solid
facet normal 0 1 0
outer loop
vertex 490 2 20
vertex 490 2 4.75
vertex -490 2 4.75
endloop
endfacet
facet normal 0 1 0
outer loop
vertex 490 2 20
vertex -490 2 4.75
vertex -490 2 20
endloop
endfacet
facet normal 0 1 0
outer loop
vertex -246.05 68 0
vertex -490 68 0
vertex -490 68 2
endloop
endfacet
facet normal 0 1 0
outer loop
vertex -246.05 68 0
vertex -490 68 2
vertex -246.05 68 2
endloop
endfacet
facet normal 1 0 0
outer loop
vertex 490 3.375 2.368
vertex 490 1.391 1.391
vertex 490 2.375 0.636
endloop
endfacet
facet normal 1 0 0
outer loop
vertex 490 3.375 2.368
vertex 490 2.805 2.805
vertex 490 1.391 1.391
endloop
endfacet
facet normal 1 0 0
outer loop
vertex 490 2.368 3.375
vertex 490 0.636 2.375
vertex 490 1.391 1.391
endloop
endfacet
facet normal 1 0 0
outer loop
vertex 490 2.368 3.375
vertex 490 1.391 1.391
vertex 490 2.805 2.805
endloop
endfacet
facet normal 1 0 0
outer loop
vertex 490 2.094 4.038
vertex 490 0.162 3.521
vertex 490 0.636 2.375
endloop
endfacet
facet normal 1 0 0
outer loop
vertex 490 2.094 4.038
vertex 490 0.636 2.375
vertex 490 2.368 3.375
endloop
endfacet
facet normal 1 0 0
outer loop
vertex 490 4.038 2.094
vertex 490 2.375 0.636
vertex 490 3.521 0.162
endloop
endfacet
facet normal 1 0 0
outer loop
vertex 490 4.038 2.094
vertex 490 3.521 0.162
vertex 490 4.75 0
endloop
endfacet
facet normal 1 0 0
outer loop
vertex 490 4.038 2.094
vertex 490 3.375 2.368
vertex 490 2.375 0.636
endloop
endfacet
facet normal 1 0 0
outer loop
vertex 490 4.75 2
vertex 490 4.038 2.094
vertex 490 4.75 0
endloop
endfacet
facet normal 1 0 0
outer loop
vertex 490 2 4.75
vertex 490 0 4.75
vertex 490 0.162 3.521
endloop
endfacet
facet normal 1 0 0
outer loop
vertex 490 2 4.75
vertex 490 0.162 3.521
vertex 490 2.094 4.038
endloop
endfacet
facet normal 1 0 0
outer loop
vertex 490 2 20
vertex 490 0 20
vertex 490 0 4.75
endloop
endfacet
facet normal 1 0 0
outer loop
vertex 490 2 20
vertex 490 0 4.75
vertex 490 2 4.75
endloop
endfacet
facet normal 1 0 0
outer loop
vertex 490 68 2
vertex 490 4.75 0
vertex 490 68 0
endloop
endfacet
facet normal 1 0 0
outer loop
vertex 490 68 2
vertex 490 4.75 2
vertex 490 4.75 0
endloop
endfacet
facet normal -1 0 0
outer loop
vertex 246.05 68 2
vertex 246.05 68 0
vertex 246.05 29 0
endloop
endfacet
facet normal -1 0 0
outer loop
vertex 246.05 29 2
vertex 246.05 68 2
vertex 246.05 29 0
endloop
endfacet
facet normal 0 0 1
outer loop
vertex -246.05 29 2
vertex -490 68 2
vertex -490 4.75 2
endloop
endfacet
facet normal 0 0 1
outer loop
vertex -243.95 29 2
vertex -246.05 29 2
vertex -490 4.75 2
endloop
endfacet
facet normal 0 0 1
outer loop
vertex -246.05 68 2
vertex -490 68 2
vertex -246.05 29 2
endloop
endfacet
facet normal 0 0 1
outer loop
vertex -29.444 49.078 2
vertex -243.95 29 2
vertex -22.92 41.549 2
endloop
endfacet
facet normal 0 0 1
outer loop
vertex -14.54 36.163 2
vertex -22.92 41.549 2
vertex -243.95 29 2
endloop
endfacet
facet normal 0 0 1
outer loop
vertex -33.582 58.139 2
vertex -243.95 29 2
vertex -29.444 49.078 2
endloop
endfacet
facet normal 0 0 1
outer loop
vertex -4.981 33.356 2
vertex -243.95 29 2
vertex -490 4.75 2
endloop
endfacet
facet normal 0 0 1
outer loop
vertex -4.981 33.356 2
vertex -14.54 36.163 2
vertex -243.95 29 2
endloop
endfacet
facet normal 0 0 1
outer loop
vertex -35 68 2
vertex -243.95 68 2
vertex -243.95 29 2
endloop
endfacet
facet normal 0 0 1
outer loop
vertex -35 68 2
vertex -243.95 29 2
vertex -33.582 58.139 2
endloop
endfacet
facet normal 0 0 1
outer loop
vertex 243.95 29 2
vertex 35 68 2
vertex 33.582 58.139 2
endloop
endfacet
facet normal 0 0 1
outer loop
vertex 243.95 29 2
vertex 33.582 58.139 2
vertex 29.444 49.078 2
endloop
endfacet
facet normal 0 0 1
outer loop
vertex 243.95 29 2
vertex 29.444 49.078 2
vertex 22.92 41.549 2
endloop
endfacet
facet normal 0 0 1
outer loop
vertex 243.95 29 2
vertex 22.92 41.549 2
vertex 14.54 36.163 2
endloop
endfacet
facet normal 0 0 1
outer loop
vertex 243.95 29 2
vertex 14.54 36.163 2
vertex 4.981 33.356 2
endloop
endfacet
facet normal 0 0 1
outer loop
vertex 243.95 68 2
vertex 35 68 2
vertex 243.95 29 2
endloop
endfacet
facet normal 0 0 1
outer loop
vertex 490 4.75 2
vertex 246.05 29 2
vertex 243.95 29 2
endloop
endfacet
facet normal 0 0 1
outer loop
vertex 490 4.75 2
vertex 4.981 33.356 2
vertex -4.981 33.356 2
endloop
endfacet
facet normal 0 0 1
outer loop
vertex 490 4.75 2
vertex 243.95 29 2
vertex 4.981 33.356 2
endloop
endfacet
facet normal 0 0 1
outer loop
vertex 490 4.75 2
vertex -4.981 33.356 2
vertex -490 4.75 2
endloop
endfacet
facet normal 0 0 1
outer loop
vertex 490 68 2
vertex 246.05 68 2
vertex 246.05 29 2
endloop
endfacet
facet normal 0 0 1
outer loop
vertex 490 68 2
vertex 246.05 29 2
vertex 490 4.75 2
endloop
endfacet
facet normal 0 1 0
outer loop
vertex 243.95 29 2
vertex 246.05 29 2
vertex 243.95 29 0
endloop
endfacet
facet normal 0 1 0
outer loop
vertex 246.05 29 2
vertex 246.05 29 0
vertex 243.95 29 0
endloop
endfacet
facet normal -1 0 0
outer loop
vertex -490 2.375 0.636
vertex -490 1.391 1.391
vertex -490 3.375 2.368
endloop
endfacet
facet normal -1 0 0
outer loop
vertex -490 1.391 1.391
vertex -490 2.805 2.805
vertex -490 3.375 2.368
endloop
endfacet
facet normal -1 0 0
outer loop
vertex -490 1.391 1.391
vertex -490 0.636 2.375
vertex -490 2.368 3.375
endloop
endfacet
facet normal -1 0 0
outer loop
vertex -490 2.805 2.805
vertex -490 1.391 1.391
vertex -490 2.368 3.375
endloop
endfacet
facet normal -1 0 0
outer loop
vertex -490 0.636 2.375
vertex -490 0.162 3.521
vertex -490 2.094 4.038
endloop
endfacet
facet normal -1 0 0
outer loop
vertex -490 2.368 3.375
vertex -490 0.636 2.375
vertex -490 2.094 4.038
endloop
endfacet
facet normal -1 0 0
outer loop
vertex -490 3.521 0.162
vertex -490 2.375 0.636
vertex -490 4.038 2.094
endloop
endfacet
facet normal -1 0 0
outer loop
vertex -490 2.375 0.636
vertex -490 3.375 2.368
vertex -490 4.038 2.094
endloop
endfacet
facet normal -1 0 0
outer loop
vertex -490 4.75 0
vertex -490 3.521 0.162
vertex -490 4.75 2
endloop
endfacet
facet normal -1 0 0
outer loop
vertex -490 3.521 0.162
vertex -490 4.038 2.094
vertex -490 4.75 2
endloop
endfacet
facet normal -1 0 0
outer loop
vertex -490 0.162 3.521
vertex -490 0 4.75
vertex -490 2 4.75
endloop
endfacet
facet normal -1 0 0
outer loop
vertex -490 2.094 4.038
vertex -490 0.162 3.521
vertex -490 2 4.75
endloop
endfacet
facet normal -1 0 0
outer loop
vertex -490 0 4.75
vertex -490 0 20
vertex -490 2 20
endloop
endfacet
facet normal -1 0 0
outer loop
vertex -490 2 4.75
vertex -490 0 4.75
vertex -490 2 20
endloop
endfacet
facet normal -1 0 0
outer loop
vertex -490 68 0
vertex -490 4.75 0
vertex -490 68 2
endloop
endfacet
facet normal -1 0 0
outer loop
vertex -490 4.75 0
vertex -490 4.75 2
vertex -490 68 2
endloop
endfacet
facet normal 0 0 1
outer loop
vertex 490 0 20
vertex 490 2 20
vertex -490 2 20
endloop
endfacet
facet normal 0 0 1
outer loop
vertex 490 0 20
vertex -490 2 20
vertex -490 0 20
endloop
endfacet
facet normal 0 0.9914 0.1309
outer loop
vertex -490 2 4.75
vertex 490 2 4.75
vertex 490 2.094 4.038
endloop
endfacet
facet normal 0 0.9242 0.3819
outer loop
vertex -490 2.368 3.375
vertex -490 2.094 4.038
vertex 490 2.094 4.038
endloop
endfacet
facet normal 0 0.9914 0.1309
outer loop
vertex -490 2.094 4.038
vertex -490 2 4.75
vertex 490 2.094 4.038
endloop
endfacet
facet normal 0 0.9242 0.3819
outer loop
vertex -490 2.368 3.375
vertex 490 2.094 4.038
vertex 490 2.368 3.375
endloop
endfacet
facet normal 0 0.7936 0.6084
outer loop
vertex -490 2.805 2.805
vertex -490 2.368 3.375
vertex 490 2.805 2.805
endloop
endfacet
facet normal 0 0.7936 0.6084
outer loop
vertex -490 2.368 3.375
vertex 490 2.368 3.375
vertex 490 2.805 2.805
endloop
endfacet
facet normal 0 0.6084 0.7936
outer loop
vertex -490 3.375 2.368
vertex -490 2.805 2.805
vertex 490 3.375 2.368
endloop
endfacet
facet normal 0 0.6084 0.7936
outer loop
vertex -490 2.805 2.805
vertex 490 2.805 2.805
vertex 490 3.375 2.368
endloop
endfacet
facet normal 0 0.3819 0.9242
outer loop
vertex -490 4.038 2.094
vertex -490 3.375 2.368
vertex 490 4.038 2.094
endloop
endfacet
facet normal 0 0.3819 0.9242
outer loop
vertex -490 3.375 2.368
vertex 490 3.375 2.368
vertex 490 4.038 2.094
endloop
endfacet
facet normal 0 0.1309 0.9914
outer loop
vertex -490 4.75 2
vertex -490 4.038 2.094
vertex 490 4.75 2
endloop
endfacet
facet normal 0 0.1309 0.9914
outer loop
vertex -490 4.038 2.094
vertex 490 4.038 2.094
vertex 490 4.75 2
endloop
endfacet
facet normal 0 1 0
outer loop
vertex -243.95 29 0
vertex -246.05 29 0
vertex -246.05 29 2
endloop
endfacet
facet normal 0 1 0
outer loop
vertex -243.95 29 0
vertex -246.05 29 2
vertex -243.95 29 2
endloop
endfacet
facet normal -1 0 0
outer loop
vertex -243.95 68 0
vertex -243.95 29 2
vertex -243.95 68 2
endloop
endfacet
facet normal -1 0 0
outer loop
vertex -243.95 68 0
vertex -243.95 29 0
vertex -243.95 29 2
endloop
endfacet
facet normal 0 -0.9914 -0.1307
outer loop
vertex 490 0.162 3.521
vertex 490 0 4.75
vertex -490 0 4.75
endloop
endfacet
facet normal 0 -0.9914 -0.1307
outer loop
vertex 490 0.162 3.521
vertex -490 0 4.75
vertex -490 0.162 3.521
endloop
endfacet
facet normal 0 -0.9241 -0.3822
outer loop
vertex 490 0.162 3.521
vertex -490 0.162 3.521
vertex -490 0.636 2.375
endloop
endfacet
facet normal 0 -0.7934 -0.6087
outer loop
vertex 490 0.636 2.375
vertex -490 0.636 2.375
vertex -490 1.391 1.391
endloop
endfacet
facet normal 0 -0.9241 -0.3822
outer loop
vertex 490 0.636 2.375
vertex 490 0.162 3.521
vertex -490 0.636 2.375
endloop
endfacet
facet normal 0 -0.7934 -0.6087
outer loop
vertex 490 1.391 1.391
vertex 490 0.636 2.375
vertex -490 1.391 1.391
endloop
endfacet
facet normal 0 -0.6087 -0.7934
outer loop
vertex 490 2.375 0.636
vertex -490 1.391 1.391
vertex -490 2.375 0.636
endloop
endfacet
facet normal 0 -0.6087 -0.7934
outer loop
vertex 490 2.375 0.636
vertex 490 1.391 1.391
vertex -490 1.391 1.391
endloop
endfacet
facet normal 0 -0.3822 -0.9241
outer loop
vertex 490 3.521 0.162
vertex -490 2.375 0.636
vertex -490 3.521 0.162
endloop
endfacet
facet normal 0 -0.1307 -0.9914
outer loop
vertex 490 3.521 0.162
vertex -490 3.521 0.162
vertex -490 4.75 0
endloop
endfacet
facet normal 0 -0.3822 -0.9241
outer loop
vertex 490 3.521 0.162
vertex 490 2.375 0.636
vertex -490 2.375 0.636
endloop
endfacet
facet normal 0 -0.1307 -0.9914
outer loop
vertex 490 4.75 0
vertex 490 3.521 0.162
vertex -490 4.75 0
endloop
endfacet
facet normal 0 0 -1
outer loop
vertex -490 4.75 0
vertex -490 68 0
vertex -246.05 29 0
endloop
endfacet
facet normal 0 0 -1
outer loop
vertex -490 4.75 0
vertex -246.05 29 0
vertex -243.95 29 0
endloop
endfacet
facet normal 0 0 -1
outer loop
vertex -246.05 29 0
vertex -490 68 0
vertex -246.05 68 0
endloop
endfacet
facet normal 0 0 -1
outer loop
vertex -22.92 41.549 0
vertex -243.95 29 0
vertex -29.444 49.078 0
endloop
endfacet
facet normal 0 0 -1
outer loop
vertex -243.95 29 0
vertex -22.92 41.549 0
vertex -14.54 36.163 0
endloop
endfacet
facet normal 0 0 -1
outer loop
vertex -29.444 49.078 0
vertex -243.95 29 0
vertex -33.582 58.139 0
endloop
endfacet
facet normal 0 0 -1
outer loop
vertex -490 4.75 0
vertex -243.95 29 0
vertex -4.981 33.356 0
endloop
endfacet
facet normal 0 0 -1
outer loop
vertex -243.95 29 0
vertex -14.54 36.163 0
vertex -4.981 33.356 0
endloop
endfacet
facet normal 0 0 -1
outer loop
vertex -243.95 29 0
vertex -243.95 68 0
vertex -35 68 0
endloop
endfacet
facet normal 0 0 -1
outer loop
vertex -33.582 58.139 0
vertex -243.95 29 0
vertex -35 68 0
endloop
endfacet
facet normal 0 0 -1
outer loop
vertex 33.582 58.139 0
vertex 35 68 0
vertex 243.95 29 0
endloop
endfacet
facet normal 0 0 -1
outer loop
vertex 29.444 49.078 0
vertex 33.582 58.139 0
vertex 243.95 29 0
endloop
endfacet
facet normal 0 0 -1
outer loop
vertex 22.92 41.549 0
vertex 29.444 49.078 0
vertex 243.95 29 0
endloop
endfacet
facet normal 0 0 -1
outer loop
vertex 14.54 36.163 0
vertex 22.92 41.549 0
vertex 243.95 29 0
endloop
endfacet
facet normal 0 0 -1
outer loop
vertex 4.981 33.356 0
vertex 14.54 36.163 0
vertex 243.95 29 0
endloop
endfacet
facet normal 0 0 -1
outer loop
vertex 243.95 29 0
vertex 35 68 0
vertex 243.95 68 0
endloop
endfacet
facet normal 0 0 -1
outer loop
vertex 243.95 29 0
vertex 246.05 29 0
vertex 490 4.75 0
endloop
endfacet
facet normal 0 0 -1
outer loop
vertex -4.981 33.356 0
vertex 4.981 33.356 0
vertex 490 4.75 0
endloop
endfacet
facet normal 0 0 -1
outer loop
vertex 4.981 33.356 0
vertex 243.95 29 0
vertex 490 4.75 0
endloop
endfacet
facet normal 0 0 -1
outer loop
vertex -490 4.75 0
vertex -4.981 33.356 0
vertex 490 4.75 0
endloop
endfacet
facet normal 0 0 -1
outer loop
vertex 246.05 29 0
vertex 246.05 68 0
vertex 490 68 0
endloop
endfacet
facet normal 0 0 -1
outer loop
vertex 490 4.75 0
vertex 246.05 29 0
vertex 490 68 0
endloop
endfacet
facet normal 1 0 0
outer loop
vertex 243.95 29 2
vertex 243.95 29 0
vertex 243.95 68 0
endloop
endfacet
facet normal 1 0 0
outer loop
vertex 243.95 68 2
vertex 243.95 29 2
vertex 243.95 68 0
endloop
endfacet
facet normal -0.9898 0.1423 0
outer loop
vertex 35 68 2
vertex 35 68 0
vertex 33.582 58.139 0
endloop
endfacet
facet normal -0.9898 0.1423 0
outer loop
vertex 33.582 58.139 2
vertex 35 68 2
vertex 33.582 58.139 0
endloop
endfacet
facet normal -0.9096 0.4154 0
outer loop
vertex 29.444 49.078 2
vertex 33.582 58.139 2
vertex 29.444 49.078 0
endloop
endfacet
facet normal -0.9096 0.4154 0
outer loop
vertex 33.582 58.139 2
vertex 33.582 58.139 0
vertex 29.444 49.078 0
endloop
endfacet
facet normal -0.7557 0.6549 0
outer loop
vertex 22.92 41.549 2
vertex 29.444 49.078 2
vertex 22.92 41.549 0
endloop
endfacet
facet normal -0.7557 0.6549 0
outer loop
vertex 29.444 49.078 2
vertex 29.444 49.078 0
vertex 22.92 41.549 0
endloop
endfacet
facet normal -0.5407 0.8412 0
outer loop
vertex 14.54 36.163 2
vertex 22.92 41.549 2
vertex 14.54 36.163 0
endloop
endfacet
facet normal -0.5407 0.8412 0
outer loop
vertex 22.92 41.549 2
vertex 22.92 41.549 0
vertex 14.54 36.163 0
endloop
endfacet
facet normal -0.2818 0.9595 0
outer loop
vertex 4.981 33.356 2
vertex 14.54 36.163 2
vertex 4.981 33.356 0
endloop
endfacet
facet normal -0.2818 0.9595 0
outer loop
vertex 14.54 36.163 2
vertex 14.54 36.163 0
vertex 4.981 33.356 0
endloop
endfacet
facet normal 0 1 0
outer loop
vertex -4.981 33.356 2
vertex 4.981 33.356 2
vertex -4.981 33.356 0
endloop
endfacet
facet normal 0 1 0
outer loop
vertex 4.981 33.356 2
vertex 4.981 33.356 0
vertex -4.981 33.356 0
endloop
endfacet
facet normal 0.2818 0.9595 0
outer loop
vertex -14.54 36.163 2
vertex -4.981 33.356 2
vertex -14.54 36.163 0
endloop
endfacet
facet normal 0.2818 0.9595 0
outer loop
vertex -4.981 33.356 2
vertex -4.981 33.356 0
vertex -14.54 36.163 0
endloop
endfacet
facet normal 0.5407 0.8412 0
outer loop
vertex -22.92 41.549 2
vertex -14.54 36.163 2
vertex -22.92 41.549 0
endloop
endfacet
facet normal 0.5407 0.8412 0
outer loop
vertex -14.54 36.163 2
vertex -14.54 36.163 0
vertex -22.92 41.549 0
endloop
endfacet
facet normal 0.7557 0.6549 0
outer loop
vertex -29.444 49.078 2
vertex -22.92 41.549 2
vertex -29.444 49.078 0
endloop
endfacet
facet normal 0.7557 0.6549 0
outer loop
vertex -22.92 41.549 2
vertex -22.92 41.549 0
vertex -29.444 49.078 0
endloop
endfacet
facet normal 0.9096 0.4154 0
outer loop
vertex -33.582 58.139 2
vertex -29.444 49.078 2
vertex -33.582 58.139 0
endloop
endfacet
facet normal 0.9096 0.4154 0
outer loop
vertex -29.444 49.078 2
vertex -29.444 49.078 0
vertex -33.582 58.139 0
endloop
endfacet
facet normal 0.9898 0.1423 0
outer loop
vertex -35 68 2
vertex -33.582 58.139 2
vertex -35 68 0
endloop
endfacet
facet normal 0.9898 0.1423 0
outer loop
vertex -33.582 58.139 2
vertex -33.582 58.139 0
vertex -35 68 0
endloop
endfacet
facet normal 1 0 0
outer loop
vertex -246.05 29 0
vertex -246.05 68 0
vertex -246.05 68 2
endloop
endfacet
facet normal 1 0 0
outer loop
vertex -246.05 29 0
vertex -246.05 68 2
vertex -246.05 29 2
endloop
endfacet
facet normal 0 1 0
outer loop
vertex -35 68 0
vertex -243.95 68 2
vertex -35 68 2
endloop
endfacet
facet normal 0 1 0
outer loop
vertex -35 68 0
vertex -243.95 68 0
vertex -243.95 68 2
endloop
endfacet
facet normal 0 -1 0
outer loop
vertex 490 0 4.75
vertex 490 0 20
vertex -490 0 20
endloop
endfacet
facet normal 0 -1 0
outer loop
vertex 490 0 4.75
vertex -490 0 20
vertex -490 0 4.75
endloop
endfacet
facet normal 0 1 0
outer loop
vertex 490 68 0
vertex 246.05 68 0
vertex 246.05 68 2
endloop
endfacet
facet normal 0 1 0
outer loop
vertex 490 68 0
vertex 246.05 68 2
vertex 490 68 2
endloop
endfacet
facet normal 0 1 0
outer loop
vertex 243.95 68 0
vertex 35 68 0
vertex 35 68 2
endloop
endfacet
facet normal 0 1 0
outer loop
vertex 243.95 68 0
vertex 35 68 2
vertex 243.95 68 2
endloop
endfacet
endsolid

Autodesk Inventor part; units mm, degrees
ref_plane "YZ Plane" through (0, 0, 0) normal (1, 0, 0) x (0, 1, 0)
ref_plane "XZ Plane" through (0, 0, 0) normal (0, 1, 0) x (-1, 0, 0)
ref_plane "XY Plane" through (0, 0, 0) normal (0, 0, 1) x (1, 0, 0)
sketch "Sketch1" plane through (0, 0, 0) normal (0, 0, 1) x (1, 0, 0)
  line L0 (-490, 68) -> (490, 68)
  line L1 (490, 68) -> (490, 0)
  line L2 (490, 0) -> (-490, 0)
  line L3 (-490, 0) -> (-490, 68)
  point P0 (0, 0)
  point P1 (0, 0)
  dimension "d0" = 980
  dimension "d1" = 68
extrude "Plate1" add sketch "Sketch1" along normal blind 2
sketch "Sketch2" plane through (490, 2, 0) normal (0, -1, 0) x (1, 0, 0)
  line L0 (-980, 0) -> (0, 0)
  line L1 (0, 0) -> (0, 20)
  line L2 (0, 20) -> (-980, 20)
  line L3 (-980, 20) -> (-980, 0)
edge flange "Flange1" height 20 angle 90 thickness 2 bend radius 2.75 thickness toward (0, -1, 0) relief round relief width 2 relief depth 1 edges at (0, 0, 2) wall of the first edge with corners at (-490, 2, 0) (490, 2, 0) (490, 2, 20) (-490, 2, 20)
bend "Bend1"
corner "Corner1"
sketch "Sketch5" plane through (0, 0, 0) normal (0, 0, -1) x (-1, 0, 0)
  line L0 (490, 68) -> (-490, 68) projected
  line L1 (490, 0) -> (-490, 0) projected
  circle A0 centre (0, 68) radius 35
  line L2 (243.95, 68) -> (246.05, 68)
  line L3 (246.05, 68) -> (246.05, 29)
  line L4 (246.05, 29) -> (243.95, 29)
  line L5 (243.95, 29) -> (243.95, 68)
  line L6 (-243.95, 68) -> (-246.05, 68)
  line L7 (-246.05, 68) -> (-246.05, 29)
  line L8 (-246.05, 29) -> (-243.95, 29)
  line L9 (-243.95, 29) -> (-243.95, 68)
  line L10 (0, 68) -> (0, 0) construction
  point P0 (0, 0)
  point P1 (245, 29)
  point P2 (-245, 29)
  point P3 (-35, 68)
  point P4 (35, 68)
  dimension "d45" = 70
  dimension "d48" = 2.1
  dimension "d49" = 490
  dimension "d51" = 29
  dimension "d52" = 39
extrude "Extrusion1" cut sketch "Sketch5" against normal through all contours L3 L4 L5 L0 | L9 L8 L7 L0 | A0 L0 picked at (-5.3545, 54.8926)
sketch "Sketch9" plane through (0, 0, 2) normal (0, 0, 1) x (1, 0, 0)
  line L0 (485.6141, 29.596) -> (485.6141, 17.596) construction
  line L1 (485.6141, 17.596) -> (285.6141, 17.596) construction
  line L2 (285.6141, 17.596) -> (285.6141, 29.596) construction
  line L3 (285.6141, 29.596) -> (485.6141, 29.596) construction
  line L4 (-490, 68) -> (490, 68) projected
  point P0 (0, 0)
  point P1 (1.05, 68)
  dimension "d40" = 200
  dimension "d41" = 12
mark "Mark2"
equation "\"d1\" = СПИНА_Стрингер_2_высота"
equation "\"d2\" = Thickness"
equation "\"d3\" = BendReliefWidth"
equation "\"d4\" = BendReliefDepth"
equation "\"d5\" = MinimumRemnant"
equation "\"d6\" = TransitionRadius"
equation "\"d9\" = BendRadius"
equation "\"d10\" = CornerReliefSize"
equation "\"d11\" = GapSize"
equation "\"d12\" = JacobiRadiusSize"
equation "\"BendReliefWidth\" = Thickness"
equation "\"BendReliefDepth\" = 0.5 * Thickness"
equation "\"CornerReliefSize\" = 4 * Thickness"
equation "\"MinimumRemnant\" = 2 * Thickness"
equation "\"TransitionRadius\" = BendRadius"
equation "\"JacobiRadiusSize\" = BendRadius"
equation "\"GapSize\" = Thickness"
equation "\"СПИНА_Стрингер_2_высота\" = 68"
equation "\"Thickness\" = 2"
equation "\"BendRadius\" = 2.75"
properties part number "MSC 062 stringer back ^^" material "Stainless Steel"
